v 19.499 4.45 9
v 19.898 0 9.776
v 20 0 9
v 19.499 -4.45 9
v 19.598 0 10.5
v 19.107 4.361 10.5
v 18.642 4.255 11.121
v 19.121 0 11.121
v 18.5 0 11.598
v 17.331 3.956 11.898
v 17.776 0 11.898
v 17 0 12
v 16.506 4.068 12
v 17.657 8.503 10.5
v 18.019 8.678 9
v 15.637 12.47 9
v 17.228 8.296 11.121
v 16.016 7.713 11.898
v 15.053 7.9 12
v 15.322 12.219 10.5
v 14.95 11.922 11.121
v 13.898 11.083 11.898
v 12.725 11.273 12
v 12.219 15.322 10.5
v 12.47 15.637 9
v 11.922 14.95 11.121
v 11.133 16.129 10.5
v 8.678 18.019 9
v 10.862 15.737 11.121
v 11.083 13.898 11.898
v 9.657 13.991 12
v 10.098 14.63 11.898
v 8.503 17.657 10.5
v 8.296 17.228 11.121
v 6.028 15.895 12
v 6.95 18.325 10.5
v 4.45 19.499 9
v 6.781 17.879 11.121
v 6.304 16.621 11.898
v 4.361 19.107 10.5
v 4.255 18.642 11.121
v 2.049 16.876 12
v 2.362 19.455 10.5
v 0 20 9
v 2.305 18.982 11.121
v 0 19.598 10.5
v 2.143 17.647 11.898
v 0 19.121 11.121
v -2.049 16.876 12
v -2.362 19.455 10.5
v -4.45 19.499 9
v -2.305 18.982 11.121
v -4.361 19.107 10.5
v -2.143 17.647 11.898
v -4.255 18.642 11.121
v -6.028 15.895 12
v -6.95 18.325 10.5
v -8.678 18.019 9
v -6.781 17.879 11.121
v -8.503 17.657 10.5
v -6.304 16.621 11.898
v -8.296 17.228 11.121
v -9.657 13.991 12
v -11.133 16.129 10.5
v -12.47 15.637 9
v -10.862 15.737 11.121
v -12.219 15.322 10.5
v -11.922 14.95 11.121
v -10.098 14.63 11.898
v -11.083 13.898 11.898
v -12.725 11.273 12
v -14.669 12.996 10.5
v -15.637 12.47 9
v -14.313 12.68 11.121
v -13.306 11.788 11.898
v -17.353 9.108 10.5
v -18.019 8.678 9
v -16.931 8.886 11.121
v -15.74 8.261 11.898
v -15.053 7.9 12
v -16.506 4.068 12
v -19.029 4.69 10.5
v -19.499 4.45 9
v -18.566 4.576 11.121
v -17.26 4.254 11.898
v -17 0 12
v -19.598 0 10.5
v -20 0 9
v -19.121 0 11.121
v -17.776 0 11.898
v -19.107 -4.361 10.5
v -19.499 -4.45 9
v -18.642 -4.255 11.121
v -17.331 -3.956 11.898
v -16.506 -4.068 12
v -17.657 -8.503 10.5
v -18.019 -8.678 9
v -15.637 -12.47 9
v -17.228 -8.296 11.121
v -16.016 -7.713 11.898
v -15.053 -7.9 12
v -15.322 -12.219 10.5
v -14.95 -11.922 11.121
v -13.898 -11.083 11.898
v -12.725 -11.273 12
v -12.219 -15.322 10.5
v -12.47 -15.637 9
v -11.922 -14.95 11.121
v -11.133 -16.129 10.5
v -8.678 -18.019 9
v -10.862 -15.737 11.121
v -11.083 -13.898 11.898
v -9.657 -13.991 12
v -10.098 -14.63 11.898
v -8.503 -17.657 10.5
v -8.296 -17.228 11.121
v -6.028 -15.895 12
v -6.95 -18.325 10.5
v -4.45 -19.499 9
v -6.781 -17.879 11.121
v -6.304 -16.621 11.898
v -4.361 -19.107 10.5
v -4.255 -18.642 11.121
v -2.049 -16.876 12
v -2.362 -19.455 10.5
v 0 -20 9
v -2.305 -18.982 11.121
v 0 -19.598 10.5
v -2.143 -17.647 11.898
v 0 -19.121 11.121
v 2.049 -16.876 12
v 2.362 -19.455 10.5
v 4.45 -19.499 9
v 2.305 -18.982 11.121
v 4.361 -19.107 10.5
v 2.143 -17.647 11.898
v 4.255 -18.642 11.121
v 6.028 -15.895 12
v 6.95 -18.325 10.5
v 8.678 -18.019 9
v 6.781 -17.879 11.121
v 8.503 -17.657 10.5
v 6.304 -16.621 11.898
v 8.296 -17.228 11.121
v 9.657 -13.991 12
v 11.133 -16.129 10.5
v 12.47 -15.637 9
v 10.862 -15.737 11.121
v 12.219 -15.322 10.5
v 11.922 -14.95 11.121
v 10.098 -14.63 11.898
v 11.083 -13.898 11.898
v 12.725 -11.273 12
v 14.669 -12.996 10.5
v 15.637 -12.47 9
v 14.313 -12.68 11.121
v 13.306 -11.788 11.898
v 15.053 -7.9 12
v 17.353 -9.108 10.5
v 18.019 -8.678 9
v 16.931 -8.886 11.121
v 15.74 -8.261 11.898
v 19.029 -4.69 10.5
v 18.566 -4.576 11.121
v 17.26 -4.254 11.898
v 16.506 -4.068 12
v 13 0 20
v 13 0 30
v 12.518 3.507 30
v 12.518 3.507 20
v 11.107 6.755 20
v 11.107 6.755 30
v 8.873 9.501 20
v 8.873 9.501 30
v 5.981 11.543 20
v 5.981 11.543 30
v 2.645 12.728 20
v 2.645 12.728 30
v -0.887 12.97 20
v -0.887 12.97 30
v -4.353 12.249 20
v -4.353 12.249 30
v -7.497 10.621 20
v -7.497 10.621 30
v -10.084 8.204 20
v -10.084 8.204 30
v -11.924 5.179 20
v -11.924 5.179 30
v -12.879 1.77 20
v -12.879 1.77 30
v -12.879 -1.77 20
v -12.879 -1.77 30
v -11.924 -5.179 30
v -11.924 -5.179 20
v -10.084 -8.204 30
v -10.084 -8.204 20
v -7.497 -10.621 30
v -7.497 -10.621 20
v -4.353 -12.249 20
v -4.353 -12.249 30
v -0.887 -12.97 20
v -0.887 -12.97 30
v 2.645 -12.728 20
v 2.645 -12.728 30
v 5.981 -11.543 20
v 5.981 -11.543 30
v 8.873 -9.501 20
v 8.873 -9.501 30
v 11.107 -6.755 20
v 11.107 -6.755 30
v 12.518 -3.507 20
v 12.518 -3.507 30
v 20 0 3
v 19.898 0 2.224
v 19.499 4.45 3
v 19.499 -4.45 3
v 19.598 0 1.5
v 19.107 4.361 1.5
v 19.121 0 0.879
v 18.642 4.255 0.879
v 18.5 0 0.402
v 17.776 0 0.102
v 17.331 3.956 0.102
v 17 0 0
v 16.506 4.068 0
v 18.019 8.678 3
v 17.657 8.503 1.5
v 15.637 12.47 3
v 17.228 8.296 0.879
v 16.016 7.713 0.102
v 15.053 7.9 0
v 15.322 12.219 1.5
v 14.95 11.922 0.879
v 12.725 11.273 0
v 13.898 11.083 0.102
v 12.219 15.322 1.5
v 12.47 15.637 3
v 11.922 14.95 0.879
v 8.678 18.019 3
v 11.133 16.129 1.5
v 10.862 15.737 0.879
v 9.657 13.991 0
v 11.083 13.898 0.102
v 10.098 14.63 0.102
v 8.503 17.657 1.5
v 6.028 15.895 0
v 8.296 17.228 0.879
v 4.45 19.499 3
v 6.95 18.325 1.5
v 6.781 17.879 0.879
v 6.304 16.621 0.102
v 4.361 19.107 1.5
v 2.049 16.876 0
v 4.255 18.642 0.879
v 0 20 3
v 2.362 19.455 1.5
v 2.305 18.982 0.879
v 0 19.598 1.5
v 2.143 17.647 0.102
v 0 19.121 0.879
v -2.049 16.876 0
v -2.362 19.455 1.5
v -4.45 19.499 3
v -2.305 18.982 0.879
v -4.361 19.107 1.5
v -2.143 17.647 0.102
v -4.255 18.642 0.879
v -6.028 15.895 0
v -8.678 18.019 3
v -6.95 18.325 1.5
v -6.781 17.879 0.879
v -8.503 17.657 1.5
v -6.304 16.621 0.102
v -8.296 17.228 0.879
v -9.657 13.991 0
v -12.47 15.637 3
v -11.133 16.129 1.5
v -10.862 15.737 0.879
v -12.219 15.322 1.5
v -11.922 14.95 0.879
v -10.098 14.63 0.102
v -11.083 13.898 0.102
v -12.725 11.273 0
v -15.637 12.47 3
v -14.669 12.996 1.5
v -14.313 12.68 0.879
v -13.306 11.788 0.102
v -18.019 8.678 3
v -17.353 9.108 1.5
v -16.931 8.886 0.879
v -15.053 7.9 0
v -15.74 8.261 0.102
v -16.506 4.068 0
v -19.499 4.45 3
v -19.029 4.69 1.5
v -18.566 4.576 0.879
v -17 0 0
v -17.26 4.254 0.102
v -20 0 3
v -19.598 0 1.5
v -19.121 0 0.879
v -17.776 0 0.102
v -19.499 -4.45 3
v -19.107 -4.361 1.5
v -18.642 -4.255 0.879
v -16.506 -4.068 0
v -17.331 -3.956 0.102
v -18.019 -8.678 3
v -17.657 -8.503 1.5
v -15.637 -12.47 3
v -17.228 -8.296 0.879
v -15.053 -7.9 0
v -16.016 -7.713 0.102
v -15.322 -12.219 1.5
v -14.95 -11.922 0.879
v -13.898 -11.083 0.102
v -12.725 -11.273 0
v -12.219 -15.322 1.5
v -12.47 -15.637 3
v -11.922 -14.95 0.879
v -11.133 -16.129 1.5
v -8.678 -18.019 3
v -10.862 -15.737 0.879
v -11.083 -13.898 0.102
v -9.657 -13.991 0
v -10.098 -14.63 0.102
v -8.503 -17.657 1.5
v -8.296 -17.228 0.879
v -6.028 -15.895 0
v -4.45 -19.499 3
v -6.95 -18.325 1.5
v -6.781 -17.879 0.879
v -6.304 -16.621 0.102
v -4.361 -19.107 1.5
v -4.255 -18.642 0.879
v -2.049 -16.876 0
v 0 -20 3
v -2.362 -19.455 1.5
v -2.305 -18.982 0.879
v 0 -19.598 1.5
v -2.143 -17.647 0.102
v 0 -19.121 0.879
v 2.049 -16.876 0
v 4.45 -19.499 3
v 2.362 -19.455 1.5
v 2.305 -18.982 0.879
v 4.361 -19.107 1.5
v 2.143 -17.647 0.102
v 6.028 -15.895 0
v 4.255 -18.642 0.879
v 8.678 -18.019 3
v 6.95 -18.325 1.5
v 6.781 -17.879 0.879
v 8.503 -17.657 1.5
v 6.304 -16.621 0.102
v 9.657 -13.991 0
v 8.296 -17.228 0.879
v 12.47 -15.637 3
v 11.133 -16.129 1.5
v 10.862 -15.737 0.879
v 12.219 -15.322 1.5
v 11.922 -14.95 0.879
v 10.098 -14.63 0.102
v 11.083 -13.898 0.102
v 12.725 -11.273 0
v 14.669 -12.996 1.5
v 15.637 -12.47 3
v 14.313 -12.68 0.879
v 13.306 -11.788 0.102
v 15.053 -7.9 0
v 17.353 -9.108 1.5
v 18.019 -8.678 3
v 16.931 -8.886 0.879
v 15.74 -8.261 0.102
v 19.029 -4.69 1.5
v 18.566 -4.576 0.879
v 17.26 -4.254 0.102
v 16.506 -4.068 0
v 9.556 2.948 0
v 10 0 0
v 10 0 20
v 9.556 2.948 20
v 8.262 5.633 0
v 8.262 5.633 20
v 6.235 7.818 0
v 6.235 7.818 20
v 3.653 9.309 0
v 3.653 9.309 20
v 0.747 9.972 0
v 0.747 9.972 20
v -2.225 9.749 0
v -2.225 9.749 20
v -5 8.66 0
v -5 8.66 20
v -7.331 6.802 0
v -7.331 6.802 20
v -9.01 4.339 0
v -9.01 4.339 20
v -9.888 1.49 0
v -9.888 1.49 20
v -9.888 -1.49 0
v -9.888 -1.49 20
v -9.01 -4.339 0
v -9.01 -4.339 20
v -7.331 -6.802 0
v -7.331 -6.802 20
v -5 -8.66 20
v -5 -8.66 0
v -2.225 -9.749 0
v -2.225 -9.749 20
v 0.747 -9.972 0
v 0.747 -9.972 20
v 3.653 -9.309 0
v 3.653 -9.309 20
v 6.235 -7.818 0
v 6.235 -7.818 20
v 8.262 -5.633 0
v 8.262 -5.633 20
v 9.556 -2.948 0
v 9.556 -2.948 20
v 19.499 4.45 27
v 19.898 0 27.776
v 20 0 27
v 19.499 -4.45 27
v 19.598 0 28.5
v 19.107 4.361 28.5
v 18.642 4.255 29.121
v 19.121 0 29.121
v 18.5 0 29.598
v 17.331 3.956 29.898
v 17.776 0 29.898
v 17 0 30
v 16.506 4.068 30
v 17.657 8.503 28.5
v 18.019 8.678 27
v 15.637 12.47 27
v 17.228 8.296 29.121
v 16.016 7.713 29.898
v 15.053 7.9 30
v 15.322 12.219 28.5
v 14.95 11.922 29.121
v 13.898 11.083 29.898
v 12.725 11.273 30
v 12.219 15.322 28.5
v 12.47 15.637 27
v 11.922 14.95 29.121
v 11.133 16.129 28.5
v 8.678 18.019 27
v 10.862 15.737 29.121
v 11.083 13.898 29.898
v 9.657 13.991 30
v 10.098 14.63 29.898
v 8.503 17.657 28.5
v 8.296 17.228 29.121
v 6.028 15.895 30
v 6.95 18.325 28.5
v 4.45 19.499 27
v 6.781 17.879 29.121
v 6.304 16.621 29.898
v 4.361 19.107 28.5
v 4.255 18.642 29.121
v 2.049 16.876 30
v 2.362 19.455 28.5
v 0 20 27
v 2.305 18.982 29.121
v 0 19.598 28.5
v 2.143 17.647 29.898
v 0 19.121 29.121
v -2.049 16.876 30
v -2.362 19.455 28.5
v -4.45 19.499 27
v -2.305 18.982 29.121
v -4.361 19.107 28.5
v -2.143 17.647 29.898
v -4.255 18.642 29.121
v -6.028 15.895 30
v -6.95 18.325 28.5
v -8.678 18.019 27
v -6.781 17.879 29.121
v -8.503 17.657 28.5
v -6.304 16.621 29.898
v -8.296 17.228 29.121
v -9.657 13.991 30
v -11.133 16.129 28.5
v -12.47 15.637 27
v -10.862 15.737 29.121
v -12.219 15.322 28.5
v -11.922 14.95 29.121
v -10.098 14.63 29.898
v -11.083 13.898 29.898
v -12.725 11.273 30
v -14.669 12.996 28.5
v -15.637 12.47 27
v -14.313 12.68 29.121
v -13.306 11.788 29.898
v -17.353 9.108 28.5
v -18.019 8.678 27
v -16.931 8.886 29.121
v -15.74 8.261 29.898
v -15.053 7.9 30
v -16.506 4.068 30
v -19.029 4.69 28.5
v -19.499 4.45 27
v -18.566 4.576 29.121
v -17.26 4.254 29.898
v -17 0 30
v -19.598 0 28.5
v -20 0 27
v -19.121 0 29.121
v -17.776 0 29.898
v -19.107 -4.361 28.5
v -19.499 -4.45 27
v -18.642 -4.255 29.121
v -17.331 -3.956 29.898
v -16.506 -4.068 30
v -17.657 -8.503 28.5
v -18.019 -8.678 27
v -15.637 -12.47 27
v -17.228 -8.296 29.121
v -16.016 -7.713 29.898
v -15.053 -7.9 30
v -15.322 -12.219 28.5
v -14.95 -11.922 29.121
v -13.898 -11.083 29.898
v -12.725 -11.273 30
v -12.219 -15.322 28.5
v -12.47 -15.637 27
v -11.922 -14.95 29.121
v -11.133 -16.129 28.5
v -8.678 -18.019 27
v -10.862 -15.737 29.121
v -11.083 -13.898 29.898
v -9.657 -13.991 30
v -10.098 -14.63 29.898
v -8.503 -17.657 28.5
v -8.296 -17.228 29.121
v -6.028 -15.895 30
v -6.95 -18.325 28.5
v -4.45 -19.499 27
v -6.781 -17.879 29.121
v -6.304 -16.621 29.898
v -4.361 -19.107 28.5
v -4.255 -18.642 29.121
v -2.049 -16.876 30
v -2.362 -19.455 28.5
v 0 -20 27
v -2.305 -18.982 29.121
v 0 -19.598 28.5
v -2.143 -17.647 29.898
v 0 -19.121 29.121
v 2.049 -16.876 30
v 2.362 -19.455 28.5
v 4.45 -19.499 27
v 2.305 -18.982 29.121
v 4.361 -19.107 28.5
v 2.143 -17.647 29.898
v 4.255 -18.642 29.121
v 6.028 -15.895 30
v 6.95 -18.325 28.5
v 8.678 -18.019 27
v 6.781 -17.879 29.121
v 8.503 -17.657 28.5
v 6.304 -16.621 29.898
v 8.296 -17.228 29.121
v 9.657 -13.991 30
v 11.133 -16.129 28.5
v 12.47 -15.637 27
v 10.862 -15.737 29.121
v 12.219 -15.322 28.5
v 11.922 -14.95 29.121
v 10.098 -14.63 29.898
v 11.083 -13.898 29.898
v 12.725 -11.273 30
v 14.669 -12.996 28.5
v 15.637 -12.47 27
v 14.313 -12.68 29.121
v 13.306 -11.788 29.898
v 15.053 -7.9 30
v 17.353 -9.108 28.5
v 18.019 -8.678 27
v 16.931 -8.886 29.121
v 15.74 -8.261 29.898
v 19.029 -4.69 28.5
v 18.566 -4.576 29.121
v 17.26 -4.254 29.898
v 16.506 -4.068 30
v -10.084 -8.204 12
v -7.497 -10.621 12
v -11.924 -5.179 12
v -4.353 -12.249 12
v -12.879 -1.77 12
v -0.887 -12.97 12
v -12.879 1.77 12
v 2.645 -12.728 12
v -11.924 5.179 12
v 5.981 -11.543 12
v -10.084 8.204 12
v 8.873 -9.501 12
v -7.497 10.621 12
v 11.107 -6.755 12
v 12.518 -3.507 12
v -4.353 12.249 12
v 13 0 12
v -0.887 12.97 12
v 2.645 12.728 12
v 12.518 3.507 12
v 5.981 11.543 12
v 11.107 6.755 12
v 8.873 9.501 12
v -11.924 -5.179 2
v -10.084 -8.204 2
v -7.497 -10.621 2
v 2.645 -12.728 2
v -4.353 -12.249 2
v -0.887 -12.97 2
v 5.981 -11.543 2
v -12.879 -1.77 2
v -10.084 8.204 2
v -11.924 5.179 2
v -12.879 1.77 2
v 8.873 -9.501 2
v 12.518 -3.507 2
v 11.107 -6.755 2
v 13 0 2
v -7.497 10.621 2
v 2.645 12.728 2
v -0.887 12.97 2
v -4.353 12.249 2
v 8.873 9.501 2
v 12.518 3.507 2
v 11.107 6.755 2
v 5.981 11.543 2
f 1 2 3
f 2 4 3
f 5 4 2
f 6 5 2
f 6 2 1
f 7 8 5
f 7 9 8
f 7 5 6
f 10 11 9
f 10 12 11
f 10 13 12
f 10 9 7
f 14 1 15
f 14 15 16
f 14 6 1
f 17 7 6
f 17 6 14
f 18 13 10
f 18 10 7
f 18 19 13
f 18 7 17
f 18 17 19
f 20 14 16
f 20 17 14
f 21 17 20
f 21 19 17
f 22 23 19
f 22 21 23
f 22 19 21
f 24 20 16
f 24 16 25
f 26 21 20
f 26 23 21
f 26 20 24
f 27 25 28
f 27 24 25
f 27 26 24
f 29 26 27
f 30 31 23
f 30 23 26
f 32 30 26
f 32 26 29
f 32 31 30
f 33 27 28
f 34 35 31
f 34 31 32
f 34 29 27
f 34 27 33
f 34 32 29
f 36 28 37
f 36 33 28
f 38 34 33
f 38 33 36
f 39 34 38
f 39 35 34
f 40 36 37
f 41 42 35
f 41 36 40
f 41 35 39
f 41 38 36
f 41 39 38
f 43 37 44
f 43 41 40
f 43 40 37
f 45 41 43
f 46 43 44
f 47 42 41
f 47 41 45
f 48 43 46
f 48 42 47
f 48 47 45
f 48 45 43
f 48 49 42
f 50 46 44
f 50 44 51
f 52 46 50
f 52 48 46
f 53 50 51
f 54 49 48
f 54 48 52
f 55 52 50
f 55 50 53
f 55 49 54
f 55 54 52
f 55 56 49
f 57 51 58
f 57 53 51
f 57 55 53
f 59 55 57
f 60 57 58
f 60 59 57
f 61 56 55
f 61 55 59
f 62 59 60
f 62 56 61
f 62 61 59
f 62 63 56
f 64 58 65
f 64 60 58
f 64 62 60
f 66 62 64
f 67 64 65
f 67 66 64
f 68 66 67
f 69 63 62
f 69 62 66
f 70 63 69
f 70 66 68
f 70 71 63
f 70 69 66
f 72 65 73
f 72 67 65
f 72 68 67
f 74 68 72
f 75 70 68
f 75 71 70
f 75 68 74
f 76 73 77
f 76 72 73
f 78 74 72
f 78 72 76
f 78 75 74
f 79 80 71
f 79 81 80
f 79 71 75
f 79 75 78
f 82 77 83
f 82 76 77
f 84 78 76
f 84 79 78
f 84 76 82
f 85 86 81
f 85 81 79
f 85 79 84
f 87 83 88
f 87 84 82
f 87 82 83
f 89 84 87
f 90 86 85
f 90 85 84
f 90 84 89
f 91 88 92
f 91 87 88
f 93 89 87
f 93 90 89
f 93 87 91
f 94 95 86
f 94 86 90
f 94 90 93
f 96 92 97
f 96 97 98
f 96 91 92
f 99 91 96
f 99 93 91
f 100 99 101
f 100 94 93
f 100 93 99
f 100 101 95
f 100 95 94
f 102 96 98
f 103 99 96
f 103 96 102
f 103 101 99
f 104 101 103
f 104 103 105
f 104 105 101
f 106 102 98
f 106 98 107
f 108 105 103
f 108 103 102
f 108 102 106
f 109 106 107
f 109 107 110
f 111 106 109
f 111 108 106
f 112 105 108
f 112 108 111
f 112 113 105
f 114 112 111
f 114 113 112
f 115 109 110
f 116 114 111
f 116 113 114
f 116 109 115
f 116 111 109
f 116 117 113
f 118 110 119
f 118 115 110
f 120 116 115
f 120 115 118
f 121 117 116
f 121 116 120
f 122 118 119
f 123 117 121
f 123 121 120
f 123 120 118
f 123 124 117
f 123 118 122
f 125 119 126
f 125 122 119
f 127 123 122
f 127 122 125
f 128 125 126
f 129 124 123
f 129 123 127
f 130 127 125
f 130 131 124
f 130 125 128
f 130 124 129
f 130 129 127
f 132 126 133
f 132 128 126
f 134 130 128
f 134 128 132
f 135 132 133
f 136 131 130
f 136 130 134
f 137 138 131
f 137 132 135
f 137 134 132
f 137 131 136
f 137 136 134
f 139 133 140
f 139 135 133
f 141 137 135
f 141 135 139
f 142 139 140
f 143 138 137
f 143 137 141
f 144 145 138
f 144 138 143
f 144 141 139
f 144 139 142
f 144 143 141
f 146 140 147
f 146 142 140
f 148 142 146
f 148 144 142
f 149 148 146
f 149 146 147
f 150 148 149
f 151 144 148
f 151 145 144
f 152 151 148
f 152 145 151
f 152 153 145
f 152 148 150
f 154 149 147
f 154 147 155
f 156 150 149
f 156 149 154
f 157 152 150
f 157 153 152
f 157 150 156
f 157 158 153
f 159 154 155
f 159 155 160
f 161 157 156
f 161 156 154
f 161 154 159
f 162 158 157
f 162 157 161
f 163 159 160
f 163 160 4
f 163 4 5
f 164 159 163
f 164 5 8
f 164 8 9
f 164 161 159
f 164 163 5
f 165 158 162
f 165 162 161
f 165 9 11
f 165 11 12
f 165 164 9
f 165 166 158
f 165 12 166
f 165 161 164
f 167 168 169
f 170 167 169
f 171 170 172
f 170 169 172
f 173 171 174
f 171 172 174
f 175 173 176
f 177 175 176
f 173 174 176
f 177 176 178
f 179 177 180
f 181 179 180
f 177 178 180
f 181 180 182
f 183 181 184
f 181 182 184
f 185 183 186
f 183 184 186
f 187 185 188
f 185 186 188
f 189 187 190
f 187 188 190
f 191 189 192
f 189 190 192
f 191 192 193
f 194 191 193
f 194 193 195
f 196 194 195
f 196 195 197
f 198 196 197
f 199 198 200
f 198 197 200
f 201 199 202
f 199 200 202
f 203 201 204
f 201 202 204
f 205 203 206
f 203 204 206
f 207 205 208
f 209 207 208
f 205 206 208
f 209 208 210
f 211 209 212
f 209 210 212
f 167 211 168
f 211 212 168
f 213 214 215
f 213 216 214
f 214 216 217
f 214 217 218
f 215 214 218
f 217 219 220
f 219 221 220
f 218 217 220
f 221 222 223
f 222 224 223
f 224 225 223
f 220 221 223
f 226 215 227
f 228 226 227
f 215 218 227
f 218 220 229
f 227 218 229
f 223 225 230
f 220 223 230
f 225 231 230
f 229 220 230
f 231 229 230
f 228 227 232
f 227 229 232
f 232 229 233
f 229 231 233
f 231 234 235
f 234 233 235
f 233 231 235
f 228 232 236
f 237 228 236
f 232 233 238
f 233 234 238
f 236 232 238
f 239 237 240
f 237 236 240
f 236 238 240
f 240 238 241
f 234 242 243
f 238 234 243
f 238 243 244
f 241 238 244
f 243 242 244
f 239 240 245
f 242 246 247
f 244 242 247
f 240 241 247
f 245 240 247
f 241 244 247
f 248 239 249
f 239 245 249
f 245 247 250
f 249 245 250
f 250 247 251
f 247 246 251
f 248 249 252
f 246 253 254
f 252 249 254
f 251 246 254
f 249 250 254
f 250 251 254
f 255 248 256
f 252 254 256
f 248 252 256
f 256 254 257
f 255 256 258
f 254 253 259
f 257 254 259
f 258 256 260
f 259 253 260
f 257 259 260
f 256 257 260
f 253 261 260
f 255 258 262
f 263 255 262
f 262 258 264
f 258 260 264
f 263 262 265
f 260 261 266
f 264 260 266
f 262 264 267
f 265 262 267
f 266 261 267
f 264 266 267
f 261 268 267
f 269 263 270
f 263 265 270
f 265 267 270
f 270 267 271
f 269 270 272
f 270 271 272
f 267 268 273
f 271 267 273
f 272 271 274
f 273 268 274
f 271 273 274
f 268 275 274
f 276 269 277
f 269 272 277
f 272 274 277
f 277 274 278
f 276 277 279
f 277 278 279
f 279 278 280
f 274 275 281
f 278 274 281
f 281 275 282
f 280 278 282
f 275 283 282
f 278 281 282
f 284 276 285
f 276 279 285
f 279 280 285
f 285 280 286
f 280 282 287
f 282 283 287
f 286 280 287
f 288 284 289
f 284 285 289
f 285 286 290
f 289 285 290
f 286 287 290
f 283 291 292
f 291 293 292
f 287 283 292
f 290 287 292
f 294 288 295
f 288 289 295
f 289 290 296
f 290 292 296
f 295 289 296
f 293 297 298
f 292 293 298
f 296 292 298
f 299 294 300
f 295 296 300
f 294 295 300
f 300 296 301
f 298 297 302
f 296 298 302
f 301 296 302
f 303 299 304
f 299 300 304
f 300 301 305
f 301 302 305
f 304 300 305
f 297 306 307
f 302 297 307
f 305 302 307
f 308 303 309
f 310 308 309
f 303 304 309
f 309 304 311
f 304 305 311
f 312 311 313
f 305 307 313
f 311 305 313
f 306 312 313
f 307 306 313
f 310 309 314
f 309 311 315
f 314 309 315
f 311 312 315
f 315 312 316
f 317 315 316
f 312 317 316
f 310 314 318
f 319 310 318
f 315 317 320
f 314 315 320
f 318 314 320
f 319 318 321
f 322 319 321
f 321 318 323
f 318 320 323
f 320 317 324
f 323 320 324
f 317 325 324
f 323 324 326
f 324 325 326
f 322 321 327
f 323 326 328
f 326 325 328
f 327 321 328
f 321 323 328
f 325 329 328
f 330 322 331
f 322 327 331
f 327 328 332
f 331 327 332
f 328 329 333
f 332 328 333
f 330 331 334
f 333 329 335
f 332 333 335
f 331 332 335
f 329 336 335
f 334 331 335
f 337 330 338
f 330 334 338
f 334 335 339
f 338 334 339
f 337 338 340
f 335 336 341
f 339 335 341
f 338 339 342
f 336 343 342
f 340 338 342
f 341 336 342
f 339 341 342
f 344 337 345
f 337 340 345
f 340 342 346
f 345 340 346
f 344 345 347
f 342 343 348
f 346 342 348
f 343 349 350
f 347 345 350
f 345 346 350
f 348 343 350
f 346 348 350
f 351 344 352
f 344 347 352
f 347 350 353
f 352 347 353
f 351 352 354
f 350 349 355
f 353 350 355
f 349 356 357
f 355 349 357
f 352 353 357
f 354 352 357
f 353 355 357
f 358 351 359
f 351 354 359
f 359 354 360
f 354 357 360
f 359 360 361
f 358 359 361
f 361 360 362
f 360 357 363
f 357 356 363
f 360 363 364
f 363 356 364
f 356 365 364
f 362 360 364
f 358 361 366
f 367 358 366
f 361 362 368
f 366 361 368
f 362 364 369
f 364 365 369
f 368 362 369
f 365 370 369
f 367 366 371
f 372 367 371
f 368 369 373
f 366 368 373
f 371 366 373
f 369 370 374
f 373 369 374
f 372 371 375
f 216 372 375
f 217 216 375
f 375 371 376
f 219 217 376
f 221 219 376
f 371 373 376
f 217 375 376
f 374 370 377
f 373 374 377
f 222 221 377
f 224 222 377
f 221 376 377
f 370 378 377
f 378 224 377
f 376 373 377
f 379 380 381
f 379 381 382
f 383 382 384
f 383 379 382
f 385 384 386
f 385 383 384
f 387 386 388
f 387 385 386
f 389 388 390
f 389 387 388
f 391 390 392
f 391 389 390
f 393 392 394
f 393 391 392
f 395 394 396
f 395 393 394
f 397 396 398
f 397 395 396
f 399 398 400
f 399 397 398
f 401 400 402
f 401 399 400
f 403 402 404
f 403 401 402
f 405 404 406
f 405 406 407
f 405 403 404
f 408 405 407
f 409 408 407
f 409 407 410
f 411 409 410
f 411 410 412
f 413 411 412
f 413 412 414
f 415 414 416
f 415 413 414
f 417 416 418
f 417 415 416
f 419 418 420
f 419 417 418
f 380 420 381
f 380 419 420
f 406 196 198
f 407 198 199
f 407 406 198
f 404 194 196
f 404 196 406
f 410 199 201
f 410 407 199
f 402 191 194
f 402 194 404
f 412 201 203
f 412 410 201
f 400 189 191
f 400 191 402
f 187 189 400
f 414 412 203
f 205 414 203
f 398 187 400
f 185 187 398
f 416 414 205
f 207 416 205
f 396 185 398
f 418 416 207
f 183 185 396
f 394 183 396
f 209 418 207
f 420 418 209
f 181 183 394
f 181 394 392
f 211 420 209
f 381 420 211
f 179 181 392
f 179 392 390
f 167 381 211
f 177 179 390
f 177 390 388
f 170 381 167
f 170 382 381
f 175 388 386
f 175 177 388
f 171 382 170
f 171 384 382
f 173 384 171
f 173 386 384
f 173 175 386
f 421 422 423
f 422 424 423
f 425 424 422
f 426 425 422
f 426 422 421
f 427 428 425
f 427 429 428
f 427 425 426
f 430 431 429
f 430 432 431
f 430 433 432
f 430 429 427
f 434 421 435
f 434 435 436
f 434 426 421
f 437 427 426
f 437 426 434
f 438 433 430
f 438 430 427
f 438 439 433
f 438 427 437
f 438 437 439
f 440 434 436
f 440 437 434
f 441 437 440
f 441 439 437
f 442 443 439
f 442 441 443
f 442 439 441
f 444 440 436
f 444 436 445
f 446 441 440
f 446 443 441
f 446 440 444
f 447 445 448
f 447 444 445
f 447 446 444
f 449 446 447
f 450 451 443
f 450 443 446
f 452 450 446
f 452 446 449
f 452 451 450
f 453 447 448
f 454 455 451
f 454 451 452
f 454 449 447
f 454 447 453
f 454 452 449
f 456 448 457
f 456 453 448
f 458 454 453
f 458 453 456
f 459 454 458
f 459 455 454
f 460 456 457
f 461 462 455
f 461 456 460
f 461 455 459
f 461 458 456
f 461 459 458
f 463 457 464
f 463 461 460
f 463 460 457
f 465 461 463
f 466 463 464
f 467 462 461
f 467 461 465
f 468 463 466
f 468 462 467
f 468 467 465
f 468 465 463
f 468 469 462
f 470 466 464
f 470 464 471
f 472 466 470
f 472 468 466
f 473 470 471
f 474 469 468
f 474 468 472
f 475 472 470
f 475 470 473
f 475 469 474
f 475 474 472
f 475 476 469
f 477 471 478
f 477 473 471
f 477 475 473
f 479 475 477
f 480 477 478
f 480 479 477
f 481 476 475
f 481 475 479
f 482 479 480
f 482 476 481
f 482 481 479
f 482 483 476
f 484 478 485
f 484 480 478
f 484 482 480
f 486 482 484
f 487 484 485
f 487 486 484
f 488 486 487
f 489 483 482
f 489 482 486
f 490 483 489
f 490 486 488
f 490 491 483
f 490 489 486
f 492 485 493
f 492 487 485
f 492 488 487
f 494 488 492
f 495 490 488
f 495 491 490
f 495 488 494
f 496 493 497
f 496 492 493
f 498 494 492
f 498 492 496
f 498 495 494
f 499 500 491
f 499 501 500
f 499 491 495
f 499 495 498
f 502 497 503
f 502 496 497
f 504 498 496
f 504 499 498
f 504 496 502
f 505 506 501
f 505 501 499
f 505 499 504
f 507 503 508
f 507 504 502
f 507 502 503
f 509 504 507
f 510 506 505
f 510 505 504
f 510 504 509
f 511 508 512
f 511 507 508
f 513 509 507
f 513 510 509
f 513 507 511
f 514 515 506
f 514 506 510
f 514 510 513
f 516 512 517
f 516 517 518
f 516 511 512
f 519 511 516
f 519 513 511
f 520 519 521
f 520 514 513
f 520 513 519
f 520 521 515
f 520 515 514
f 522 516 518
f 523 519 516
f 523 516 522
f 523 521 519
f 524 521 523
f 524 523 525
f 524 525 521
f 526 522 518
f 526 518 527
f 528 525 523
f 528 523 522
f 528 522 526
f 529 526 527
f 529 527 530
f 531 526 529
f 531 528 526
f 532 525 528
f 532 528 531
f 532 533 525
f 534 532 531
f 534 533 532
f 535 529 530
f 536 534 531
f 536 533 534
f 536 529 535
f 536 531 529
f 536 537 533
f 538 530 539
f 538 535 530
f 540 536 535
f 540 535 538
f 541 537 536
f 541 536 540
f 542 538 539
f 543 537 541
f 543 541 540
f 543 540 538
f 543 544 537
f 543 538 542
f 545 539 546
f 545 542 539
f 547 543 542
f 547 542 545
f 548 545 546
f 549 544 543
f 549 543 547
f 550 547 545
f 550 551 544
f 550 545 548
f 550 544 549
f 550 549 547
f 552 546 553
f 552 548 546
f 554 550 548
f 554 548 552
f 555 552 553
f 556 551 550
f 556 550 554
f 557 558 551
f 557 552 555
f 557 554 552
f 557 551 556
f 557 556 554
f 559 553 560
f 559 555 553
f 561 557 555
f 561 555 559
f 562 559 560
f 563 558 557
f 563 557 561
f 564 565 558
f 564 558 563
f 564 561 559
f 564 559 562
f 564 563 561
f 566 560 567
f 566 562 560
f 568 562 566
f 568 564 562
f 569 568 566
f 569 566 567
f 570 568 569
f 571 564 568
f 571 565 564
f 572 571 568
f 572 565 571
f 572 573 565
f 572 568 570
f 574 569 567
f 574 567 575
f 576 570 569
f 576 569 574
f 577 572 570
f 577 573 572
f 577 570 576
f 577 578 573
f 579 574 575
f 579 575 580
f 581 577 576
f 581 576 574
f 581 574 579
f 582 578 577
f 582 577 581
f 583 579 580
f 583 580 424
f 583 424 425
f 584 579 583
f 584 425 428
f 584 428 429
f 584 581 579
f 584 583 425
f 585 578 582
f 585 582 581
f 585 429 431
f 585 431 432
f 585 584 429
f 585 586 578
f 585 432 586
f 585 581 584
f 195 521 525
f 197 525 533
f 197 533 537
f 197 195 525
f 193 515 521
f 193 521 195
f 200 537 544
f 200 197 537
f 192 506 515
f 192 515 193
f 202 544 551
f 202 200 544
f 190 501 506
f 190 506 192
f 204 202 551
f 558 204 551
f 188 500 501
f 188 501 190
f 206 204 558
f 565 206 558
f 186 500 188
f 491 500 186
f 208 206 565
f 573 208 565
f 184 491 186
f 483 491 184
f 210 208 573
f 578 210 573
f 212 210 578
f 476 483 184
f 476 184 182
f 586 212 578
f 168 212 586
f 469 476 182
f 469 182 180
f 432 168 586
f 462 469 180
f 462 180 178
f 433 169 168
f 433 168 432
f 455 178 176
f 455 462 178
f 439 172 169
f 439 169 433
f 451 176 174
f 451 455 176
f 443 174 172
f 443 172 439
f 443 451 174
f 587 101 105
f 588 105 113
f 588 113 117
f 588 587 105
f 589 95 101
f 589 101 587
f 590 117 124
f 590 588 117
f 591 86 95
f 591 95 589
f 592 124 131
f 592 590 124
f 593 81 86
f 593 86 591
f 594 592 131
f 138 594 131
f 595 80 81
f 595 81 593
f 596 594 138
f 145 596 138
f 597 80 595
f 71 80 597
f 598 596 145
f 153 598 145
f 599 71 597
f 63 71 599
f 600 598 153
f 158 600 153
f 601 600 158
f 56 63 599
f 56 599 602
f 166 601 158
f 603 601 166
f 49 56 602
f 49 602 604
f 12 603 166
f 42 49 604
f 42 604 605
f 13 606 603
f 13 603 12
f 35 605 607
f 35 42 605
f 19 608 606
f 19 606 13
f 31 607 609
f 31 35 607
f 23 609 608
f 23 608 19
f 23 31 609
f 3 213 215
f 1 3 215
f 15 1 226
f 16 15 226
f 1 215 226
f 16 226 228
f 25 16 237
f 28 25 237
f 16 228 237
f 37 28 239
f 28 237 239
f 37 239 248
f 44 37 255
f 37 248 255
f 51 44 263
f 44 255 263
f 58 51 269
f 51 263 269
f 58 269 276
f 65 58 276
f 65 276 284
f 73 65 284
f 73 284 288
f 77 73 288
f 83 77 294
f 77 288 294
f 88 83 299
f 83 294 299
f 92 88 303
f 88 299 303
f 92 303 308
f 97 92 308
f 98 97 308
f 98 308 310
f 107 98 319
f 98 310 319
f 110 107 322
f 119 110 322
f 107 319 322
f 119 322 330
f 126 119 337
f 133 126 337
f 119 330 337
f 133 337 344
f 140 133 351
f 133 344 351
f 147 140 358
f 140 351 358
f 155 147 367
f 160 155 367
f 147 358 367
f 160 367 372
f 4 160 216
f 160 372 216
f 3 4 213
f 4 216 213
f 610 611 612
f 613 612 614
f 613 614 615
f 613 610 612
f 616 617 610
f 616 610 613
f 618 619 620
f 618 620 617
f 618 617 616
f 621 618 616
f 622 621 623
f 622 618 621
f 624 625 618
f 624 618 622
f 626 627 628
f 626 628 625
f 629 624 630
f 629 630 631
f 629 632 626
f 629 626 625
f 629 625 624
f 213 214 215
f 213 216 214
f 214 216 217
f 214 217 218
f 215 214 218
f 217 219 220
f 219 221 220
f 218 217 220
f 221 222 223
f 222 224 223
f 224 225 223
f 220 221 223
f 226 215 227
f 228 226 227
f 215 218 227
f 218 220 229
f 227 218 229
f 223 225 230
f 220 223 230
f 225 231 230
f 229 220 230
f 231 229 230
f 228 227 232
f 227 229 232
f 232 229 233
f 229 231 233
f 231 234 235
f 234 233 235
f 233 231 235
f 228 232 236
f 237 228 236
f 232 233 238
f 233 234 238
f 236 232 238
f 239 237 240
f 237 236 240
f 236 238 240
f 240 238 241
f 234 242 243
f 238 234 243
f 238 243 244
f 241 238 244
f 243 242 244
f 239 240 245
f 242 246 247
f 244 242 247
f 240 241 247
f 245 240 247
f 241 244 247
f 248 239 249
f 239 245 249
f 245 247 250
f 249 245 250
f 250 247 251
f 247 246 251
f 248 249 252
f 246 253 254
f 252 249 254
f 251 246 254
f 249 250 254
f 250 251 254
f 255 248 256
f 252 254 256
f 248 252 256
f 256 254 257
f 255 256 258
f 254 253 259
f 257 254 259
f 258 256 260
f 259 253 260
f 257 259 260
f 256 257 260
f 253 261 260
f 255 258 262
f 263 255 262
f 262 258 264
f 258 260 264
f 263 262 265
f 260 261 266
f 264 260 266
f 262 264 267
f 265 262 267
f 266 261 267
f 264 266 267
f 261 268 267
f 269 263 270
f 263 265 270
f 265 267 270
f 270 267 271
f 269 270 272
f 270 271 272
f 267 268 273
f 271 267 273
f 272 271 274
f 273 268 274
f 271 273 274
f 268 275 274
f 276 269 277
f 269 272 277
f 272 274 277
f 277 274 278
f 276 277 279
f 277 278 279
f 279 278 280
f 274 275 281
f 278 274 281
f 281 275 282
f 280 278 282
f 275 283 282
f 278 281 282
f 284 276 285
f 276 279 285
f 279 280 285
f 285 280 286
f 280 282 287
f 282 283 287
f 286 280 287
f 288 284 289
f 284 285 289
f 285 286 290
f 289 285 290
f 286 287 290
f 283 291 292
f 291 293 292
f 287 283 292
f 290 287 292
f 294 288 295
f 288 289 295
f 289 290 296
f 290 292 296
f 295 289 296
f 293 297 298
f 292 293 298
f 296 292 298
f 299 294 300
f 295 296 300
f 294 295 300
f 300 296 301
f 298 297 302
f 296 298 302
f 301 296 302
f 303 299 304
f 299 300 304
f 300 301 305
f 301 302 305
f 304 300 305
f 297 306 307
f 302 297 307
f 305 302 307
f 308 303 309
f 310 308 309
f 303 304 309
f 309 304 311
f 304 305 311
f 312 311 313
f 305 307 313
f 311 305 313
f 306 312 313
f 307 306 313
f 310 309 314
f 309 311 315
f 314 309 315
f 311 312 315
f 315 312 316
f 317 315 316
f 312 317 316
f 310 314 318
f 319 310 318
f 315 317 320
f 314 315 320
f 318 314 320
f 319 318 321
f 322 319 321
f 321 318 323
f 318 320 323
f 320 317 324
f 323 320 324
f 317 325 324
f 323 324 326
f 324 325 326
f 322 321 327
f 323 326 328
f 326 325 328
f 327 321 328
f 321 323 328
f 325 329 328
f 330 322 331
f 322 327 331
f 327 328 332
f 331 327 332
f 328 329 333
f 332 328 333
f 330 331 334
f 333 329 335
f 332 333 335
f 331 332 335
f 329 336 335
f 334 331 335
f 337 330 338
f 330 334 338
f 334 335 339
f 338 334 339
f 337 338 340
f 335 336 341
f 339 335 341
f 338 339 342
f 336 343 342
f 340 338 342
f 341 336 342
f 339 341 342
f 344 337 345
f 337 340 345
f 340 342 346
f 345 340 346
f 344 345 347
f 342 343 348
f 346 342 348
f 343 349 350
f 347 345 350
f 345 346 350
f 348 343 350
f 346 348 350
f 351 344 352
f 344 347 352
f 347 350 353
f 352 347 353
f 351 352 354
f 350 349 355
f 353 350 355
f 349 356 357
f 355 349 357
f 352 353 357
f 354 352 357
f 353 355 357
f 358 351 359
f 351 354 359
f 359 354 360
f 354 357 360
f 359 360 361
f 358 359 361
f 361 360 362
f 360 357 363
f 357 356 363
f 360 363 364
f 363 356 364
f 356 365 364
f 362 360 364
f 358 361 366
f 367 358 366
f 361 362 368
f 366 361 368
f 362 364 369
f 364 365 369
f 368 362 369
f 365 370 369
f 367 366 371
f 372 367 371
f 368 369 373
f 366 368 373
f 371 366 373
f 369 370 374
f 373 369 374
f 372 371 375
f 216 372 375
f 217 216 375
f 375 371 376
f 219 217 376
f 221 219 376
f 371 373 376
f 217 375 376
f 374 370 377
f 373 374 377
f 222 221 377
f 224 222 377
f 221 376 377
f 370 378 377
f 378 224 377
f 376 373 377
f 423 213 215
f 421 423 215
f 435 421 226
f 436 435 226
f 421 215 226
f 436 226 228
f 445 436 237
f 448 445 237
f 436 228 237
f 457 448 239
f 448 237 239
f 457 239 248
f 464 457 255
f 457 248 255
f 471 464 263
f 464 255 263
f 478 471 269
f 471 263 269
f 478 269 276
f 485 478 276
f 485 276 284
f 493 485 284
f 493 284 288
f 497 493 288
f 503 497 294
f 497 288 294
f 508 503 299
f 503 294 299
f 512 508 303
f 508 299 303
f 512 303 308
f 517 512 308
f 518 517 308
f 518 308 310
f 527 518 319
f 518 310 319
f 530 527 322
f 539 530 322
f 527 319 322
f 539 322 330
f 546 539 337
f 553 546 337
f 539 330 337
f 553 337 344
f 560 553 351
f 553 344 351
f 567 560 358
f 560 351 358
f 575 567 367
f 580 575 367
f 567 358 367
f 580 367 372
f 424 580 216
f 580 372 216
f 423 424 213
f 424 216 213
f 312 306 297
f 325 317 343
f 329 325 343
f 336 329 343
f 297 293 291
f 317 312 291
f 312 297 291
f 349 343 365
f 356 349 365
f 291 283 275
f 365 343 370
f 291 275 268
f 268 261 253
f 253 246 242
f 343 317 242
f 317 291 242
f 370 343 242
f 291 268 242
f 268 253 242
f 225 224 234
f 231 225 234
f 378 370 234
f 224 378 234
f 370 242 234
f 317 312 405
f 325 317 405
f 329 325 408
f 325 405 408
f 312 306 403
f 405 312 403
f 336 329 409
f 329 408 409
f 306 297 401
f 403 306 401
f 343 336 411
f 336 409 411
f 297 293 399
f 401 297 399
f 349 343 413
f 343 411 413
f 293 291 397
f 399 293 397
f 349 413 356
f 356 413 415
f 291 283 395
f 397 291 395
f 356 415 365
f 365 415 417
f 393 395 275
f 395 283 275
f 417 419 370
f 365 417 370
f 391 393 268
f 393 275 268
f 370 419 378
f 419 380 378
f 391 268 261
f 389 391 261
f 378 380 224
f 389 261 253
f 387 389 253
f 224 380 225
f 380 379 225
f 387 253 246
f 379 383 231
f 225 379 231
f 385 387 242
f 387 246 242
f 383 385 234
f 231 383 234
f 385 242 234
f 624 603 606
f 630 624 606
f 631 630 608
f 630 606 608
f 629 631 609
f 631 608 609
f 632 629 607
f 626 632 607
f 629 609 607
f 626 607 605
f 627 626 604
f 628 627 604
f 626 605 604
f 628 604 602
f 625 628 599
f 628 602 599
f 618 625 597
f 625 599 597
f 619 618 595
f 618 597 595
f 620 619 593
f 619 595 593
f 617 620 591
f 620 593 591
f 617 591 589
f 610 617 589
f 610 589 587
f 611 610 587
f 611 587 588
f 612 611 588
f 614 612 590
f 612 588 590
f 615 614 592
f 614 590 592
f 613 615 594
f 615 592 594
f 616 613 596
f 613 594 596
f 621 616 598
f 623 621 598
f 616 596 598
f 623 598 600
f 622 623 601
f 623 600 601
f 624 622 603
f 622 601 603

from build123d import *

# Parameters (mm, degrees)
SKETCH_R        = 20
PAD_DEPTH       = 12
SKETCH001_R     = 13
POCKET_DEPTH    = 10
FILLET001_R     = 3
SKETCH002_R     = 20
PAD001_DEPTH    = 30
SKETCH003_R     = 13
POCKET001_DEPTH = 10
SKETCH004_R     = 10
POCKET002_DEPTH = 20
FILLET_R        = 3


with BuildPart() as seat_bottom:
    # Sketch → Pad (new body)
    with BuildSketch(Plane.XY):
        Circle(SKETCH_R)
    extrude(amount=PAD_DEPTH)

    # Sketch001 → Pocket (cut)
    with BuildSketch(Plane.XY.offset(12)):
        Circle(SKETCH001_R)
    extrude(amount=-POCKET_DEPTH, mode=Mode.SUBTRACT)

    # Fillet001
    fillet001_edges = [seat_bottom.edges().sort_by_distance(p)[0] for p in [
        (20, 0, 6),
        (-20, 0, 0),
        (-20, 0, 12),
    ]]
    fillet(fillet001_edges, radius=FILLET001_R)


with BuildPart() as seat_top:
    # Sketch002 → Pad001 (new body)
    with BuildSketch(Plane.XY):
        Circle(SKETCH002_R)
    extrude(amount=PAD001_DEPTH)

    # Sketch003 → Pocket001 (cut)
    with BuildSketch(Plane.XY.offset(30)):
        Circle(SKETCH003_R)
    extrude(amount=-POCKET001_DEPTH, mode=Mode.SUBTRACT)

    # Sketch004 → Pocket002 (cut)
    with BuildSketch(Plane.XY):
        Circle(SKETCH004_R)
    extrude(amount=POCKET002_DEPTH, mode=Mode.SUBTRACT)

    # Fillet
    fillet_edges = [seat_top.edges().sort_by_distance(p)[0] for p in [
        (20, 0, 15),
        (-20, 0, 0),
        (-20, 0, 30),
    ]]
    fillet(fillet_edges, radius=FILLET_R)


solid = Compound([seat_bottom.part, seat_top.part])
